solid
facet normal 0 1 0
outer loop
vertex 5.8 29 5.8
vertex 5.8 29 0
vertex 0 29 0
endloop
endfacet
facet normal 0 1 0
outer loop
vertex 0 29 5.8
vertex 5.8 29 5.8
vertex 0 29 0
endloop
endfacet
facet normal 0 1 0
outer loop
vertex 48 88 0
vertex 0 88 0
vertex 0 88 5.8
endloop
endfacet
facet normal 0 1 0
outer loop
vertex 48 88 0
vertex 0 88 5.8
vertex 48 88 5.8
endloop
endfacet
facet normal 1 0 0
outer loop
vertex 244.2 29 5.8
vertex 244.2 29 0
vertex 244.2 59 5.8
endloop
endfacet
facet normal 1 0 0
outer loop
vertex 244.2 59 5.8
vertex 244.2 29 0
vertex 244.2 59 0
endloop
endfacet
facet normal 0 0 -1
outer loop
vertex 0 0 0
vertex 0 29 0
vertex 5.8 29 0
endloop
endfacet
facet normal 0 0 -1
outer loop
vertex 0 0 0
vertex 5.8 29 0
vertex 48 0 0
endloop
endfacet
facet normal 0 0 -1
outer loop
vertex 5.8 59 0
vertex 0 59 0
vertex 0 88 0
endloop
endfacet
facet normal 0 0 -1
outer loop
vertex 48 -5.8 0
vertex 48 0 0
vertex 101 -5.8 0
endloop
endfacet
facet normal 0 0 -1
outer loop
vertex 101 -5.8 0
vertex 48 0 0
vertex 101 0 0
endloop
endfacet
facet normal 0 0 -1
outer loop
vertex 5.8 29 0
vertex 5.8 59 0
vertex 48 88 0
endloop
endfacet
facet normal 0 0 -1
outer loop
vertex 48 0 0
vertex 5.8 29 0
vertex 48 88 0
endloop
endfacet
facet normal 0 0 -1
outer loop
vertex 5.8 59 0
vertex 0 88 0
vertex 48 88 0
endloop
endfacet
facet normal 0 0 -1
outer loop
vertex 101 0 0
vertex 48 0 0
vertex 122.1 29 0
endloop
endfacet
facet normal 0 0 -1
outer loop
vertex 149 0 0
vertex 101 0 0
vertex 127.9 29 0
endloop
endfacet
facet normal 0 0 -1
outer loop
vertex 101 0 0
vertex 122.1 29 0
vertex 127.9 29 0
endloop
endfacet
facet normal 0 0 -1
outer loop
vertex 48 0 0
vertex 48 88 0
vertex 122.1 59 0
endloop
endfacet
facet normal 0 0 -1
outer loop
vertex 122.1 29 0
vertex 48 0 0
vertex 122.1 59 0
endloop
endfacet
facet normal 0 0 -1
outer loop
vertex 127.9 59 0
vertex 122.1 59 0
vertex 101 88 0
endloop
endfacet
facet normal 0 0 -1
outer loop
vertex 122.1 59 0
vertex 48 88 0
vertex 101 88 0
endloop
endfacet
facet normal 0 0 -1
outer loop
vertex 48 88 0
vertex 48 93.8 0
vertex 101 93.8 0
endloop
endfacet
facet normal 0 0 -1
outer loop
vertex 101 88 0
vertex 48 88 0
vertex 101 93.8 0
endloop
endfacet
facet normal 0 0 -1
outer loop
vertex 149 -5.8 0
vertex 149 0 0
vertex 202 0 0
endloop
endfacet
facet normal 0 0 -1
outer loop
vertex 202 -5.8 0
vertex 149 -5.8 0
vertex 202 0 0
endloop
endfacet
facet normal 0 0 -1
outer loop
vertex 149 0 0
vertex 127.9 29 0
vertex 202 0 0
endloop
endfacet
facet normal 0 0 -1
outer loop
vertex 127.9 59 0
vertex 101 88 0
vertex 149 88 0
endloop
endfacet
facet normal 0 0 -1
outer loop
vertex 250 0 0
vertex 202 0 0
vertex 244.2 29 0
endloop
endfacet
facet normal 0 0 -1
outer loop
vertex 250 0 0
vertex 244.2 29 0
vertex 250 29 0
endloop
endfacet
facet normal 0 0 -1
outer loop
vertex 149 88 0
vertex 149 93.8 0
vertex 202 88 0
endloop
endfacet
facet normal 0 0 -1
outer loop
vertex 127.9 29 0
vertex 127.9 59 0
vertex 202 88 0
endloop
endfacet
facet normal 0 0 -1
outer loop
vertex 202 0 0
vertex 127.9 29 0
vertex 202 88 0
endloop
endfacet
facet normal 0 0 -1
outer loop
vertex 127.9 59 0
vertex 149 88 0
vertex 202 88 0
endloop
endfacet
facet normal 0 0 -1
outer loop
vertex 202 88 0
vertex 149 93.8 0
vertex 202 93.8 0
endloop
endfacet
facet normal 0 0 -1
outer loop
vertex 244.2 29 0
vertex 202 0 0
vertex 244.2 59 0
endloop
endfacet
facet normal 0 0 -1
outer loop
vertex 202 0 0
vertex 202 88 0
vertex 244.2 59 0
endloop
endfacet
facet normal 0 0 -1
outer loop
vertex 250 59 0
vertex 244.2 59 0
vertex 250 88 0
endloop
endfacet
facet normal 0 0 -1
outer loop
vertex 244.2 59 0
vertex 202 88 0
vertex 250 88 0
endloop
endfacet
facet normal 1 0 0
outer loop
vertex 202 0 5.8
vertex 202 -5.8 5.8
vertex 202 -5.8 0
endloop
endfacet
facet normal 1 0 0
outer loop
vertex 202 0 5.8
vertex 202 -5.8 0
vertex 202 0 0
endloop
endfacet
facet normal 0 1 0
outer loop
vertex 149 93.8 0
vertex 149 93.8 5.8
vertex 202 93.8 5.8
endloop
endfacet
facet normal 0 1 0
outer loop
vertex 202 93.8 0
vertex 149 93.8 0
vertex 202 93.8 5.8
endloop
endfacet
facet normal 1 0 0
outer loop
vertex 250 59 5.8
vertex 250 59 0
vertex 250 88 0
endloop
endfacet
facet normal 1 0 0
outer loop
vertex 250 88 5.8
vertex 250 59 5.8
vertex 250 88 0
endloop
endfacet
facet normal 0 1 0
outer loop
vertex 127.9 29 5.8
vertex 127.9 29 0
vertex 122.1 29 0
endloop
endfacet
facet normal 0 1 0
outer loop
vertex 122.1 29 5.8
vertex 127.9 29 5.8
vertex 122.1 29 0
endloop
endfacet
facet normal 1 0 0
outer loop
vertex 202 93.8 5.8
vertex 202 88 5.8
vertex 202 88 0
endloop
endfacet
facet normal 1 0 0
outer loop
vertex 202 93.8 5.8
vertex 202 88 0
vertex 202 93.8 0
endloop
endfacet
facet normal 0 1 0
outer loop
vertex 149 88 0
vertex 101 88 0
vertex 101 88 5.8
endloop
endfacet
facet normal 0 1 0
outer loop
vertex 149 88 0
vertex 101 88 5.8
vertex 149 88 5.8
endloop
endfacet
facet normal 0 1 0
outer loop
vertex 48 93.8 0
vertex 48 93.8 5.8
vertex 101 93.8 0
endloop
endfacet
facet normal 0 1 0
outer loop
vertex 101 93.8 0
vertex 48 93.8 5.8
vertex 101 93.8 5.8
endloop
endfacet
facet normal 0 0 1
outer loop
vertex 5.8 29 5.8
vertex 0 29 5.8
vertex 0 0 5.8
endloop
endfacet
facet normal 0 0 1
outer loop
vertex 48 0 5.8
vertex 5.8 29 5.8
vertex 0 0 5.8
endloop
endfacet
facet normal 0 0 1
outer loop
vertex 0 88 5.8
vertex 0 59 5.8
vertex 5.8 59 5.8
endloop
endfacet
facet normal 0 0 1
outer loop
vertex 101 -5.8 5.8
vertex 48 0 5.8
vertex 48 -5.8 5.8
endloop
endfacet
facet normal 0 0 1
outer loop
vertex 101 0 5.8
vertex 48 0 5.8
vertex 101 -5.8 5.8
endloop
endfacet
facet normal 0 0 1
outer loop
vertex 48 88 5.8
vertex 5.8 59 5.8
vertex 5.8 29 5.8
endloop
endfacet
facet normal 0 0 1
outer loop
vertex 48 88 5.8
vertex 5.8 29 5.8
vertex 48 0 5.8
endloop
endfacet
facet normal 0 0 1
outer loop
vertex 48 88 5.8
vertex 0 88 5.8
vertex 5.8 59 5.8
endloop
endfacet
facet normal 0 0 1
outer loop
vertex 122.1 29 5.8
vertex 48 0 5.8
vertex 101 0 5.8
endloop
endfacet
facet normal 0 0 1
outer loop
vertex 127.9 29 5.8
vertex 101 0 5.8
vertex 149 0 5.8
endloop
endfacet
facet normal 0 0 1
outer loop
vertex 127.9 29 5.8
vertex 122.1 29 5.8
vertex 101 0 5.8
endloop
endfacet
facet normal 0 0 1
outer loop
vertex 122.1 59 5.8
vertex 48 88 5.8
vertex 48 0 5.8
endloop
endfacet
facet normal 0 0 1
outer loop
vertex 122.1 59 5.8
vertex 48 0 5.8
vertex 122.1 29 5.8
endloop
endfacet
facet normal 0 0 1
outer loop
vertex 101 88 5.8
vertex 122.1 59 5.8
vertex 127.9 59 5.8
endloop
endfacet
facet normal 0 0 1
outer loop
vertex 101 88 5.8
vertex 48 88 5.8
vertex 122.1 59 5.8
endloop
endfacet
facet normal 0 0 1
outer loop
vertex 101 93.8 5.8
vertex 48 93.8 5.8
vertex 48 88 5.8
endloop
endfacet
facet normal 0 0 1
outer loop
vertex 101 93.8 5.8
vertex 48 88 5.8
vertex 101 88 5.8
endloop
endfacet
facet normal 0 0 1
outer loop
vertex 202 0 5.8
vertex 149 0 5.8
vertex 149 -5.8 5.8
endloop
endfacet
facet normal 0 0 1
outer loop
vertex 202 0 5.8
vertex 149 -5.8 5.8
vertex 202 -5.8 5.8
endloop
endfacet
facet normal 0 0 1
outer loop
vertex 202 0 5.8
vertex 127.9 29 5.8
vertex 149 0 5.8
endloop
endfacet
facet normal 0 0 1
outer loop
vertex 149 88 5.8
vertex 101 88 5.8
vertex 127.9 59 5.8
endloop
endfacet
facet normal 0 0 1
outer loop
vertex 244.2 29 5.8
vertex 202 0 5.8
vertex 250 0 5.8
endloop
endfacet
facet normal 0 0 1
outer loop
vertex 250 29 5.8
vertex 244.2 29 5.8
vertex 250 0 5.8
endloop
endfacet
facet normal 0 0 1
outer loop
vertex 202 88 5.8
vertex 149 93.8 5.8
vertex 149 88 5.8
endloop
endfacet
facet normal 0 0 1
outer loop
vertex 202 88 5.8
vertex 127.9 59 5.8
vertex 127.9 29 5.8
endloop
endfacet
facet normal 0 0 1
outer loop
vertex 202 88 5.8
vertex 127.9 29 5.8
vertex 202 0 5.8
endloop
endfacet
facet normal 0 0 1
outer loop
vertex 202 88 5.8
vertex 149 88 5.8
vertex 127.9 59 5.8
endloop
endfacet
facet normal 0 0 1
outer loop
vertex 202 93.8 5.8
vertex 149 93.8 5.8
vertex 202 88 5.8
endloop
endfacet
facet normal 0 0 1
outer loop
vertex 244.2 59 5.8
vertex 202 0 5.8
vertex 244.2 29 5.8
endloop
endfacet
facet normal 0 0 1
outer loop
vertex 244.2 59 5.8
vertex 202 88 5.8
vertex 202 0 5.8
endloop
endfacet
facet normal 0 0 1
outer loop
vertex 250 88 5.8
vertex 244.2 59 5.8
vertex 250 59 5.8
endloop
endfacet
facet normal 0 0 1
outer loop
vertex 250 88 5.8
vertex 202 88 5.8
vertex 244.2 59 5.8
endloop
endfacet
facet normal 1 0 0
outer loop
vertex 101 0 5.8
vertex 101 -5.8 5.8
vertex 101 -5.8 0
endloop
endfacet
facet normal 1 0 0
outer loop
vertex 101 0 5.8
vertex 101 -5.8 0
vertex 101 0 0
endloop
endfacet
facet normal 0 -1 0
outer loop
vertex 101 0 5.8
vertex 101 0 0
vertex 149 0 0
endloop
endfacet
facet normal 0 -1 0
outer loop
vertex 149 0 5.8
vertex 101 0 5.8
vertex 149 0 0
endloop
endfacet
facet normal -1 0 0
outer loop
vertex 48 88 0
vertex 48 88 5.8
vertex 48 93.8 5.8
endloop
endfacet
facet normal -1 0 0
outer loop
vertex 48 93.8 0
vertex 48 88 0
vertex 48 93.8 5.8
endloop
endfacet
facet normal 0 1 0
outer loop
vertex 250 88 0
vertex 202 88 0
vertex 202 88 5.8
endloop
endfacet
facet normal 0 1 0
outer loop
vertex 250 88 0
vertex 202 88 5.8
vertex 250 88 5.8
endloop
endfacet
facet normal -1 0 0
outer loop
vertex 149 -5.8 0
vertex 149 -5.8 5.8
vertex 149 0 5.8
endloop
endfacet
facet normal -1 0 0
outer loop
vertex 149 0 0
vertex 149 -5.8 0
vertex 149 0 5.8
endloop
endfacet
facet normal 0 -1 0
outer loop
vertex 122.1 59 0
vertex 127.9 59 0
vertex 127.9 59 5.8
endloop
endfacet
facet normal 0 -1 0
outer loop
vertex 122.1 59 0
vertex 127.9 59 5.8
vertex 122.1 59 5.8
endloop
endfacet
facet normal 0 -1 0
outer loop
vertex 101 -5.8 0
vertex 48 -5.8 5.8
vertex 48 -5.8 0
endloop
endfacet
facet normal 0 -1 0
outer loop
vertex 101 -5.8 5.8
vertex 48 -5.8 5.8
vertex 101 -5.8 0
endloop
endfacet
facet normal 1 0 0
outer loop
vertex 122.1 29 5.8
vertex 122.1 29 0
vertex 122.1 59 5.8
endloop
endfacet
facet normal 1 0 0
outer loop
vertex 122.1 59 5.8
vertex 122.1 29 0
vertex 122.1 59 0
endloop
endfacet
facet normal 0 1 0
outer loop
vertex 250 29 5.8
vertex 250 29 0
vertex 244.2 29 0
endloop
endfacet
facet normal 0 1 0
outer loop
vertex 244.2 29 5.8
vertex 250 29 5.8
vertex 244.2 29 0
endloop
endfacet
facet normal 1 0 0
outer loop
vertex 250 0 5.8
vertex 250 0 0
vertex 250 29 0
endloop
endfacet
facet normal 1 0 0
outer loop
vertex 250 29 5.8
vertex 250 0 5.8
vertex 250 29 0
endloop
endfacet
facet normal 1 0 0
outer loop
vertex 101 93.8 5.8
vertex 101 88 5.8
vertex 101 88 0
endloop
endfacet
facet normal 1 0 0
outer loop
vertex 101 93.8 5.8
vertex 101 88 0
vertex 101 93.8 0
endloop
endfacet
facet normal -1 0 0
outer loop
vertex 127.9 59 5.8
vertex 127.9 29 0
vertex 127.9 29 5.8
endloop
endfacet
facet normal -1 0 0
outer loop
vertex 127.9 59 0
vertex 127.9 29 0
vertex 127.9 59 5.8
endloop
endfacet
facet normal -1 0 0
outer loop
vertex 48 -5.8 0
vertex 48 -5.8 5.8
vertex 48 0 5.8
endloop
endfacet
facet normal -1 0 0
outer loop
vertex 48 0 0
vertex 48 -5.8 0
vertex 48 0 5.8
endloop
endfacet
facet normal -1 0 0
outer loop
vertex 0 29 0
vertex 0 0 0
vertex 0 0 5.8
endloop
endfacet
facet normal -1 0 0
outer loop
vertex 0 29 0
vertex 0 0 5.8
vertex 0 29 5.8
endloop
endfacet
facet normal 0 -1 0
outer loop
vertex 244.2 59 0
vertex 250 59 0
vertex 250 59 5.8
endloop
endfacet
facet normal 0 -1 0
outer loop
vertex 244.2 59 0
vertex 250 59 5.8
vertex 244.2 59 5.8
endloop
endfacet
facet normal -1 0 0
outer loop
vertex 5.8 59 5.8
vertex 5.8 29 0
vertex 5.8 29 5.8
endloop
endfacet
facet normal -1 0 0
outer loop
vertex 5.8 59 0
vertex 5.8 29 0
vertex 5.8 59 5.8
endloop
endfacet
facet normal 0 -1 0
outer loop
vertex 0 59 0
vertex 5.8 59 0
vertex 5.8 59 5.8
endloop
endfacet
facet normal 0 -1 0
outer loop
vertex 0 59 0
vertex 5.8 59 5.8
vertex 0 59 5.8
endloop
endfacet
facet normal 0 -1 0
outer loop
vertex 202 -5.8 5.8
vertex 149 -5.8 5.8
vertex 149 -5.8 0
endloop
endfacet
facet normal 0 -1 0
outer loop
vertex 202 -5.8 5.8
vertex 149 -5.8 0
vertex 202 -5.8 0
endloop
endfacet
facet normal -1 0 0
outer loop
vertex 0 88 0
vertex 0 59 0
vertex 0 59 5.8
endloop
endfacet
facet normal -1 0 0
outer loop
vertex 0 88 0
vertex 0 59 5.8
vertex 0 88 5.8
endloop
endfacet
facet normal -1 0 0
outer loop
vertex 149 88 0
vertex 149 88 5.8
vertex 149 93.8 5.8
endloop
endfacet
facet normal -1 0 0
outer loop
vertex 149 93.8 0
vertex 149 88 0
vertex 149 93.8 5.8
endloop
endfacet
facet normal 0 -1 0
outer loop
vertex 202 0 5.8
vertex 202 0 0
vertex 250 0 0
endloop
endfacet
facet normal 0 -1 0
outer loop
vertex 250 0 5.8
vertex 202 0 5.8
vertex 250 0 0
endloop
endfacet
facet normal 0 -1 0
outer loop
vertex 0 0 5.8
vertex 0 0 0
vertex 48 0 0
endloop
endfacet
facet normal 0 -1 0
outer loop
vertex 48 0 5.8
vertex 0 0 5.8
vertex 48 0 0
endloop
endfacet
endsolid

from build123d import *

# Parameters (mm, degrees)
SKETCH_1_W          = 250
SKETCH_1_H          = 88
EXTRUDE_1_DEPTH     = 5.8
CUT_EXTRUDE_1_REACH = 267.099
SKETCH_2_W          = 5.8
SKETCH_2_H          = 30
SKETCH_3_W          = 53
SKETCH_3_H          = 5.8
EXTRUDE_2_DEPTH     = 5.8


with BuildPart() as part:
    # Эскиз1 → Бобышка-Вытянуть1 (new body)
    with BuildSketch(Plane.XY):
        with Locations((125, 44)):
            Rectangle(SKETCH_1_W, SKETCH_1_H)
    extrude(amount=EXTRUDE_1_DEPTH)

    # Эскиз2 → Вырез-Вытянуть1 (cut, up to next)
    with BuildSketch(Plane(origin=(0, 0, 0), x_dir=(-1, 0, 0), z_dir=(0, 0, -1)), mode=Mode.PRIVATE) as cut_extrude_1_sk1:
        with Locations((-247.1, 44)):
            Rectangle(SKETCH_2_W, SKETCH_2_H)
    cut_extrude_1_tool1 = extrude(cut_extrude_1_sk1.sketch, amount=-CUT_EXTRUDE_1_REACH, mode=Mode.PRIVATE) & part.part
    # Эскиз2 → Вырез-Вытянуть1 (cut, up to next)
    with BuildSketch(Plane(origin=(0, 0, 0), x_dir=(-1, 0, 0), z_dir=(0, 0, -1)), mode=Mode.PRIVATE) as cut_extrude_1_sk2:
        with Locations((-125, 44)):
            Rectangle(SKETCH_2_W, SKETCH_2_H)
    cut_extrude_1_tool2 = extrude(cut_extrude_1_sk2.sketch, amount=-CUT_EXTRUDE_1_REACH, mode=Mode.PRIVATE) & part.part
    # Эскиз2 → Вырез-Вытянуть1 (cut, up to next)
    with BuildSketch(Plane(origin=(0, 0, 0), x_dir=(-1, 0, 0), z_dir=(0, 0, -1)), mode=Mode.PRIVATE) as cut_extrude_1_sk3:
        with Locations((-2.9, 44)):
            Rectangle(SKETCH_2_W, SKETCH_2_H)
    cut_extrude_1_tool3 = extrude(cut_extrude_1_sk3.sketch, amount=-CUT_EXTRUDE_1_REACH, mode=Mode.PRIVATE) & part.part
    add(cut_extrude_1_tool1.solids().sort_by_distance((247.1, 44, 0))[0], mode=Mode.SUBTRACT)
    add(cut_extrude_1_tool2.solids().sort_by_distance((125, 44, 0))[0], mode=Mode.SUBTRACT)
    add(cut_extrude_1_tool3.solids().sort_by_distance((2.9, 44, 0))[0], mode=Mode.SUBTRACT)

    # Эскиз3 → Бобышка-Вытянуть2 (add)
    with BuildSketch(Plane.XY.offset(5.8)):
        with Locations((74.5, 90.9)):
            Rectangle(SKETCH_3_W, SKETCH_3_H)
        with Locations((175.5, 90.9)):
            Rectangle(SKETCH_3_W, SKETCH_3_H)
        with Locations((74.5, -2.9)):
            Rectangle(SKETCH_3_W, SKETCH_3_H)
        with Locations((175.5, -2.9)):
            Rectangle(SKETCH_3_W, SKETCH_3_H)
    extrude(amount=-EXTRUDE_2_DEPTH)


solid = part.part
